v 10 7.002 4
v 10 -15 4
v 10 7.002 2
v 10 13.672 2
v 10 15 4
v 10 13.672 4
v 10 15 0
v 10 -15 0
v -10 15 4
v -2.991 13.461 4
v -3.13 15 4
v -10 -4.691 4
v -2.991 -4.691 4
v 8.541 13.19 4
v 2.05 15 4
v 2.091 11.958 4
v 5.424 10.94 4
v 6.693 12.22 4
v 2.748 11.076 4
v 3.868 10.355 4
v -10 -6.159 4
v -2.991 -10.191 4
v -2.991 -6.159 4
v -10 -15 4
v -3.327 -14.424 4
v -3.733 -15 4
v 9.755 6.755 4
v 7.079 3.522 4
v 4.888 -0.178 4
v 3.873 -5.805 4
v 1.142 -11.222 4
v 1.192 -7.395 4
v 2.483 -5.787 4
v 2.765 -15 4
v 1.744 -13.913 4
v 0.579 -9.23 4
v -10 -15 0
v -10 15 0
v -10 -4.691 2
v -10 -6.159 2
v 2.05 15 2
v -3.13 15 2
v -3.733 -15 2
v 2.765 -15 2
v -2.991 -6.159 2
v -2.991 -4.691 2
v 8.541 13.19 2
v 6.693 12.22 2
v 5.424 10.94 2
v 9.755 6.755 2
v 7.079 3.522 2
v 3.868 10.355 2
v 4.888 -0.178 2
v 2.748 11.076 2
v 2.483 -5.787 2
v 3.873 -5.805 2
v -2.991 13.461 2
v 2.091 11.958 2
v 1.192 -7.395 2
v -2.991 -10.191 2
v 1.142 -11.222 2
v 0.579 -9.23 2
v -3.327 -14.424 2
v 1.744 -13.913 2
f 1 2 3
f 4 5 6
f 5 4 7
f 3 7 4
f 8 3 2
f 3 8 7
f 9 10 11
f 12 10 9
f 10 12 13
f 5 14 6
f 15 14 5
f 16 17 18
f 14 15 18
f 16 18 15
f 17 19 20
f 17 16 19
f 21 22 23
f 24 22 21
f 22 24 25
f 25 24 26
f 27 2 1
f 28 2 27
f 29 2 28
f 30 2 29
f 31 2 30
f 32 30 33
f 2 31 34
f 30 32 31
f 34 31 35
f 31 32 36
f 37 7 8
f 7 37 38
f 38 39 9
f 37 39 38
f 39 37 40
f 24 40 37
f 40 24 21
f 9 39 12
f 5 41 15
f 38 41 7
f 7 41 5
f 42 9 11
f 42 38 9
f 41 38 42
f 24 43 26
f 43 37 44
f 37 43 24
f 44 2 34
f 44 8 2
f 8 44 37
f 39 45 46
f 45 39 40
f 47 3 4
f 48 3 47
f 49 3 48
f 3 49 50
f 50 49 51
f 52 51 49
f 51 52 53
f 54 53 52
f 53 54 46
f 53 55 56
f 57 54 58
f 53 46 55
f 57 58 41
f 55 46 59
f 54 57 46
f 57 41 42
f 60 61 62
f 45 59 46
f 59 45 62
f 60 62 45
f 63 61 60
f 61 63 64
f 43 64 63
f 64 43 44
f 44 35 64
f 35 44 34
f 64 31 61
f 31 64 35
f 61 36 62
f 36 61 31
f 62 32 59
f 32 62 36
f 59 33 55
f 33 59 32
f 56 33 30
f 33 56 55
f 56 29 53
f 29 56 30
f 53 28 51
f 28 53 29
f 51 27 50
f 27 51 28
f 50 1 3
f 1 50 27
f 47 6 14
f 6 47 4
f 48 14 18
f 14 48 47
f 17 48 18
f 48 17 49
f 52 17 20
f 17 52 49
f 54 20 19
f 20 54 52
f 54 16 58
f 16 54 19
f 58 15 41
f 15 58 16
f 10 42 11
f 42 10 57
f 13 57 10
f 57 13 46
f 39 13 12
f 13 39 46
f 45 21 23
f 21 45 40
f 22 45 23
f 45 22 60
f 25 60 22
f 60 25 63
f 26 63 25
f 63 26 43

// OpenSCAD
difference() {
translate([0,0,2]) cube([20,30,4],center=true); 
translate([0,0,2]) scale(0.2) linear_extrude(height = 30) import("test.dxf");}
